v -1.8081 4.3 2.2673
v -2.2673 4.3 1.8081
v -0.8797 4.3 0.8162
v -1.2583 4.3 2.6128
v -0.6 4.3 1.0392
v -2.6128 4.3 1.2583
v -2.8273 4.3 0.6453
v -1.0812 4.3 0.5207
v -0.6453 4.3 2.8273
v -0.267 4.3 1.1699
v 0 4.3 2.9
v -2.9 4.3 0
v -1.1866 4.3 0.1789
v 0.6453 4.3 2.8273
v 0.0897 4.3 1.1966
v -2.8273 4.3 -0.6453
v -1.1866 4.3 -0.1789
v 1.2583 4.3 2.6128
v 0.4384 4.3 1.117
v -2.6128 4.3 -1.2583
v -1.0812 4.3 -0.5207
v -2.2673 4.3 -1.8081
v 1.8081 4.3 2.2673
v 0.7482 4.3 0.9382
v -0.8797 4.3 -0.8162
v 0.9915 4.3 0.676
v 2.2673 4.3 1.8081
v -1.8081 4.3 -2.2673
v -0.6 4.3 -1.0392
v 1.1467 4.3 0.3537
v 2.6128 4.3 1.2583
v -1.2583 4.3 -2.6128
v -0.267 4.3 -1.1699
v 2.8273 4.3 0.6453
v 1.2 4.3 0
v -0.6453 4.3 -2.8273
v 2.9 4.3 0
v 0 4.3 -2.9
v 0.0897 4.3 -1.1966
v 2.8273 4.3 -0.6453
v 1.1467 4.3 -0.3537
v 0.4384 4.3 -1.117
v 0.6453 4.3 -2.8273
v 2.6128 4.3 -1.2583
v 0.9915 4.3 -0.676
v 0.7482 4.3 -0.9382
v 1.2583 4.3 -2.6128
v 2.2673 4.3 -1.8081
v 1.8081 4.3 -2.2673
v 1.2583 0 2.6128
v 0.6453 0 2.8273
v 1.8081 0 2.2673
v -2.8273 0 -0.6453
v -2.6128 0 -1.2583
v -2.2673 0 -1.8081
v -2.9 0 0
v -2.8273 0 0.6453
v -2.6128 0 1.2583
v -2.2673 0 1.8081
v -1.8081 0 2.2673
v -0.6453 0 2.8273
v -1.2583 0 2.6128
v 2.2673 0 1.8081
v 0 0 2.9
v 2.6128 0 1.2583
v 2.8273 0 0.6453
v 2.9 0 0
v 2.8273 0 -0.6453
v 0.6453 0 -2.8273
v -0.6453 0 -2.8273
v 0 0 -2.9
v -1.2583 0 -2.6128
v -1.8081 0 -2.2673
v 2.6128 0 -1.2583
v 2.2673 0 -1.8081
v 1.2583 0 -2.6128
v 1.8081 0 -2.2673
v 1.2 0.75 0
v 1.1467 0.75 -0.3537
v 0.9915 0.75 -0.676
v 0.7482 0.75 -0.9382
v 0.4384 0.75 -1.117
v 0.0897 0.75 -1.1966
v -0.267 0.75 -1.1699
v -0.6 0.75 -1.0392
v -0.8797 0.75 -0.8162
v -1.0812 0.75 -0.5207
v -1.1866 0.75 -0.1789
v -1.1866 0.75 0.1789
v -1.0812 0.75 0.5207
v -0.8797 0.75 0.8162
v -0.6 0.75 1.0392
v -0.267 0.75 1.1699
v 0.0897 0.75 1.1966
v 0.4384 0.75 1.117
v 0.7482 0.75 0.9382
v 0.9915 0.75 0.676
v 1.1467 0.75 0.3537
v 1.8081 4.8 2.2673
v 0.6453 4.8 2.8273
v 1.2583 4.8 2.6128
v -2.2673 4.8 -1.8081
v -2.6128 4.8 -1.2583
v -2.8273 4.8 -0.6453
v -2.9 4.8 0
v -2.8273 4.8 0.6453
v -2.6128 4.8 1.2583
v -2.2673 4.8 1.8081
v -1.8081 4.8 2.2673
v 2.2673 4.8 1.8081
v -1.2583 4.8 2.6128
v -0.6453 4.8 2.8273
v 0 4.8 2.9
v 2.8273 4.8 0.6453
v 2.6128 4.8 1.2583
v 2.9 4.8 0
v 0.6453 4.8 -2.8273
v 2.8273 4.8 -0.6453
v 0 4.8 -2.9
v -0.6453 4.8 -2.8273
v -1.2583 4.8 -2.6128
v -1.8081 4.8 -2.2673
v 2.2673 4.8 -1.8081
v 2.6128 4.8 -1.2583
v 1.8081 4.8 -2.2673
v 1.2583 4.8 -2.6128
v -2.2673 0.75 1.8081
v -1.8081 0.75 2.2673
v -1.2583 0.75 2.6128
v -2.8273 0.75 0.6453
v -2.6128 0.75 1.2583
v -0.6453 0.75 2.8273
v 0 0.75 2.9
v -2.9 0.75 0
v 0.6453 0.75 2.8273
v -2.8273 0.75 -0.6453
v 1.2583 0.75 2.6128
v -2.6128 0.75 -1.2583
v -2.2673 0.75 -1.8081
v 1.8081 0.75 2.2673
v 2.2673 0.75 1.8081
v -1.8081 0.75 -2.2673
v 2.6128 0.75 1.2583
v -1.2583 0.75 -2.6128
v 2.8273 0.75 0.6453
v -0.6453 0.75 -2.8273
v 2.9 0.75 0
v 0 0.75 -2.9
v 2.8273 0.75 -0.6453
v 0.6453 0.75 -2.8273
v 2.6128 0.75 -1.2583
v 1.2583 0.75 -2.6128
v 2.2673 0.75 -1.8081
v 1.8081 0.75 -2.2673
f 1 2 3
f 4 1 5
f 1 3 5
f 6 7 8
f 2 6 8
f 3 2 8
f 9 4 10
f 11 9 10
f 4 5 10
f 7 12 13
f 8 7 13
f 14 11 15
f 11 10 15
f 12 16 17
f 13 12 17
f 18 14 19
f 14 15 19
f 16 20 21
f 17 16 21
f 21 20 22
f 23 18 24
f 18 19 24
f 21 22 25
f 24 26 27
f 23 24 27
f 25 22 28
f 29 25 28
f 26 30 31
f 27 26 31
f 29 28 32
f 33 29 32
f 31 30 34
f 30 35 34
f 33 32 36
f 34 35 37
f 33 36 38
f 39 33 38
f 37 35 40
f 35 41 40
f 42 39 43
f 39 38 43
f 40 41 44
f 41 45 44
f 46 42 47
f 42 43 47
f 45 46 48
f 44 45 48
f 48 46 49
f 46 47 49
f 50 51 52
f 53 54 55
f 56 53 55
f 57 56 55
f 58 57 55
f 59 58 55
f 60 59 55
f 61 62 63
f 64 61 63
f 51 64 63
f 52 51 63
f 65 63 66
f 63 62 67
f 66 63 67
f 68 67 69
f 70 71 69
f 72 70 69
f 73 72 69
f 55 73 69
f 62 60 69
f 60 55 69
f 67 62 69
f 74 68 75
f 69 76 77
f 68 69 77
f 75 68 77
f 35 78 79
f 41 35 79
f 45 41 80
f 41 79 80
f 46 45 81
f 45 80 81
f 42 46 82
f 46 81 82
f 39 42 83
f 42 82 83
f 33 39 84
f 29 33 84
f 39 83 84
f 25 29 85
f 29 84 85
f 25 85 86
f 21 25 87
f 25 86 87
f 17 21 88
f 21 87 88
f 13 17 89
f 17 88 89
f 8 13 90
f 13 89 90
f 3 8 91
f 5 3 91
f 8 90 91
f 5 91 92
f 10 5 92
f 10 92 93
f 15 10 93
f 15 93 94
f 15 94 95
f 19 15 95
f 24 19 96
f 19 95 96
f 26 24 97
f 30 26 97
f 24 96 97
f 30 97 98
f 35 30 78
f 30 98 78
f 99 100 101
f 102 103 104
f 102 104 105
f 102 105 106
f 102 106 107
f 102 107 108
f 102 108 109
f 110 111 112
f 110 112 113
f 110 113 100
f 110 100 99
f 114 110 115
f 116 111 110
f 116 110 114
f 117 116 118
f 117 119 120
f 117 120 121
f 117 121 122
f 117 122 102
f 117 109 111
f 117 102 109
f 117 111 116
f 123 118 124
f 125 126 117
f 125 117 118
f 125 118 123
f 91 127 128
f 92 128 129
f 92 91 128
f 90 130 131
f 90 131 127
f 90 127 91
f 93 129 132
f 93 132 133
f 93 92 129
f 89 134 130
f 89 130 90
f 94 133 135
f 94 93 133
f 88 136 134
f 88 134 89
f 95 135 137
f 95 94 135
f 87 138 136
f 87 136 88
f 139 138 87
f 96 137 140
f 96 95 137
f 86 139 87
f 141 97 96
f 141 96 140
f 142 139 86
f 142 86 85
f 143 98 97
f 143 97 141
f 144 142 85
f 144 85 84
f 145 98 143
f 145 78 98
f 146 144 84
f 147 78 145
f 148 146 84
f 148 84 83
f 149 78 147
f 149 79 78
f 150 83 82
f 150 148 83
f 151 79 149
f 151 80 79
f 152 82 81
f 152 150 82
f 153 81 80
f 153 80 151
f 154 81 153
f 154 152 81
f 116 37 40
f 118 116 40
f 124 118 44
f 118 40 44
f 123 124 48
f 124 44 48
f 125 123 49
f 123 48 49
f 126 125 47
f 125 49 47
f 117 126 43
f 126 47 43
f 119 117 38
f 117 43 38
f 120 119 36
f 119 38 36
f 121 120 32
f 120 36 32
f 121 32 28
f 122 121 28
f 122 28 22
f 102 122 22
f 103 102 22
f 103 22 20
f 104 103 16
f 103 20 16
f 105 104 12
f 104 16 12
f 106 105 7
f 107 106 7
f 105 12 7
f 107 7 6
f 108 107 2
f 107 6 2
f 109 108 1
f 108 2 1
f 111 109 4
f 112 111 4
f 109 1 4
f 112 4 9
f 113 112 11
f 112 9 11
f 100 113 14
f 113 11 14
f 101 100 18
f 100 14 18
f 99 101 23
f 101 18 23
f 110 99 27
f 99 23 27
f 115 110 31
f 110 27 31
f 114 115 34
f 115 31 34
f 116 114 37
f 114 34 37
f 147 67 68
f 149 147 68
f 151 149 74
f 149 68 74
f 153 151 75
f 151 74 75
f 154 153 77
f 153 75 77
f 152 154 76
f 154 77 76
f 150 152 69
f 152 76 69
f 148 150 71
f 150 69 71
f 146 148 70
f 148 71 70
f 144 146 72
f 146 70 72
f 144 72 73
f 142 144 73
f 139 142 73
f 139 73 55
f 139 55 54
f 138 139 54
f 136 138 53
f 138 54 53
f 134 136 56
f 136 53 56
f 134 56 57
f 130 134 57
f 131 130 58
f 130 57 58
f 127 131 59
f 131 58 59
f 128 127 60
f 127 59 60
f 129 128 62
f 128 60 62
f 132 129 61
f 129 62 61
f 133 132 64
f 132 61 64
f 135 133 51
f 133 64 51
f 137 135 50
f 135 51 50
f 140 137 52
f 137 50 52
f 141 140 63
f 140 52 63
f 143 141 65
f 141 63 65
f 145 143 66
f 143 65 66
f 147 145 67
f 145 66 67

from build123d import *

# Parameters (mm, degrees)
SKETCH1_R           = 2.9
BOSS_EXTRUDE1_DEPTH = 0.75
SKETCH2_R           = 1.2
BOSS_EXTRUDE2_DEPTH = 3.55
SKETCH3_R           = 2.9
BOSS_EXTRUDE3_DEPTH = 0.5


with BuildPart() as part:
    # Sketch1 → Boss-Extrude1 (new body)
    with BuildSketch(Plane(origin=(0, 0, 0), x_dir=(1, 0, 0), z_dir=(0, 1, 0))):
        Circle(SKETCH1_R)
    extrude(amount=BOSS_EXTRUDE1_DEPTH)

    # Sketch2 → Boss-Extrude2 (add)
    with BuildSketch(Plane(origin=(0, 0.75, 0), x_dir=(1, 0, 0), z_dir=(0, 1, 0))):
        Circle(SKETCH2_R)
    extrude(amount=BOSS_EXTRUDE2_DEPTH)

    # Sketch3 → Boss-Extrude3 (add)
    with BuildSketch(Plane(origin=(0, 4.3, 0), x_dir=(1, 0, 0), z_dir=(0, 1, 0))):
        Circle(SKETCH3_R)
    extrude(amount=BOSS_EXTRUDE3_DEPTH)


solid = part.part
